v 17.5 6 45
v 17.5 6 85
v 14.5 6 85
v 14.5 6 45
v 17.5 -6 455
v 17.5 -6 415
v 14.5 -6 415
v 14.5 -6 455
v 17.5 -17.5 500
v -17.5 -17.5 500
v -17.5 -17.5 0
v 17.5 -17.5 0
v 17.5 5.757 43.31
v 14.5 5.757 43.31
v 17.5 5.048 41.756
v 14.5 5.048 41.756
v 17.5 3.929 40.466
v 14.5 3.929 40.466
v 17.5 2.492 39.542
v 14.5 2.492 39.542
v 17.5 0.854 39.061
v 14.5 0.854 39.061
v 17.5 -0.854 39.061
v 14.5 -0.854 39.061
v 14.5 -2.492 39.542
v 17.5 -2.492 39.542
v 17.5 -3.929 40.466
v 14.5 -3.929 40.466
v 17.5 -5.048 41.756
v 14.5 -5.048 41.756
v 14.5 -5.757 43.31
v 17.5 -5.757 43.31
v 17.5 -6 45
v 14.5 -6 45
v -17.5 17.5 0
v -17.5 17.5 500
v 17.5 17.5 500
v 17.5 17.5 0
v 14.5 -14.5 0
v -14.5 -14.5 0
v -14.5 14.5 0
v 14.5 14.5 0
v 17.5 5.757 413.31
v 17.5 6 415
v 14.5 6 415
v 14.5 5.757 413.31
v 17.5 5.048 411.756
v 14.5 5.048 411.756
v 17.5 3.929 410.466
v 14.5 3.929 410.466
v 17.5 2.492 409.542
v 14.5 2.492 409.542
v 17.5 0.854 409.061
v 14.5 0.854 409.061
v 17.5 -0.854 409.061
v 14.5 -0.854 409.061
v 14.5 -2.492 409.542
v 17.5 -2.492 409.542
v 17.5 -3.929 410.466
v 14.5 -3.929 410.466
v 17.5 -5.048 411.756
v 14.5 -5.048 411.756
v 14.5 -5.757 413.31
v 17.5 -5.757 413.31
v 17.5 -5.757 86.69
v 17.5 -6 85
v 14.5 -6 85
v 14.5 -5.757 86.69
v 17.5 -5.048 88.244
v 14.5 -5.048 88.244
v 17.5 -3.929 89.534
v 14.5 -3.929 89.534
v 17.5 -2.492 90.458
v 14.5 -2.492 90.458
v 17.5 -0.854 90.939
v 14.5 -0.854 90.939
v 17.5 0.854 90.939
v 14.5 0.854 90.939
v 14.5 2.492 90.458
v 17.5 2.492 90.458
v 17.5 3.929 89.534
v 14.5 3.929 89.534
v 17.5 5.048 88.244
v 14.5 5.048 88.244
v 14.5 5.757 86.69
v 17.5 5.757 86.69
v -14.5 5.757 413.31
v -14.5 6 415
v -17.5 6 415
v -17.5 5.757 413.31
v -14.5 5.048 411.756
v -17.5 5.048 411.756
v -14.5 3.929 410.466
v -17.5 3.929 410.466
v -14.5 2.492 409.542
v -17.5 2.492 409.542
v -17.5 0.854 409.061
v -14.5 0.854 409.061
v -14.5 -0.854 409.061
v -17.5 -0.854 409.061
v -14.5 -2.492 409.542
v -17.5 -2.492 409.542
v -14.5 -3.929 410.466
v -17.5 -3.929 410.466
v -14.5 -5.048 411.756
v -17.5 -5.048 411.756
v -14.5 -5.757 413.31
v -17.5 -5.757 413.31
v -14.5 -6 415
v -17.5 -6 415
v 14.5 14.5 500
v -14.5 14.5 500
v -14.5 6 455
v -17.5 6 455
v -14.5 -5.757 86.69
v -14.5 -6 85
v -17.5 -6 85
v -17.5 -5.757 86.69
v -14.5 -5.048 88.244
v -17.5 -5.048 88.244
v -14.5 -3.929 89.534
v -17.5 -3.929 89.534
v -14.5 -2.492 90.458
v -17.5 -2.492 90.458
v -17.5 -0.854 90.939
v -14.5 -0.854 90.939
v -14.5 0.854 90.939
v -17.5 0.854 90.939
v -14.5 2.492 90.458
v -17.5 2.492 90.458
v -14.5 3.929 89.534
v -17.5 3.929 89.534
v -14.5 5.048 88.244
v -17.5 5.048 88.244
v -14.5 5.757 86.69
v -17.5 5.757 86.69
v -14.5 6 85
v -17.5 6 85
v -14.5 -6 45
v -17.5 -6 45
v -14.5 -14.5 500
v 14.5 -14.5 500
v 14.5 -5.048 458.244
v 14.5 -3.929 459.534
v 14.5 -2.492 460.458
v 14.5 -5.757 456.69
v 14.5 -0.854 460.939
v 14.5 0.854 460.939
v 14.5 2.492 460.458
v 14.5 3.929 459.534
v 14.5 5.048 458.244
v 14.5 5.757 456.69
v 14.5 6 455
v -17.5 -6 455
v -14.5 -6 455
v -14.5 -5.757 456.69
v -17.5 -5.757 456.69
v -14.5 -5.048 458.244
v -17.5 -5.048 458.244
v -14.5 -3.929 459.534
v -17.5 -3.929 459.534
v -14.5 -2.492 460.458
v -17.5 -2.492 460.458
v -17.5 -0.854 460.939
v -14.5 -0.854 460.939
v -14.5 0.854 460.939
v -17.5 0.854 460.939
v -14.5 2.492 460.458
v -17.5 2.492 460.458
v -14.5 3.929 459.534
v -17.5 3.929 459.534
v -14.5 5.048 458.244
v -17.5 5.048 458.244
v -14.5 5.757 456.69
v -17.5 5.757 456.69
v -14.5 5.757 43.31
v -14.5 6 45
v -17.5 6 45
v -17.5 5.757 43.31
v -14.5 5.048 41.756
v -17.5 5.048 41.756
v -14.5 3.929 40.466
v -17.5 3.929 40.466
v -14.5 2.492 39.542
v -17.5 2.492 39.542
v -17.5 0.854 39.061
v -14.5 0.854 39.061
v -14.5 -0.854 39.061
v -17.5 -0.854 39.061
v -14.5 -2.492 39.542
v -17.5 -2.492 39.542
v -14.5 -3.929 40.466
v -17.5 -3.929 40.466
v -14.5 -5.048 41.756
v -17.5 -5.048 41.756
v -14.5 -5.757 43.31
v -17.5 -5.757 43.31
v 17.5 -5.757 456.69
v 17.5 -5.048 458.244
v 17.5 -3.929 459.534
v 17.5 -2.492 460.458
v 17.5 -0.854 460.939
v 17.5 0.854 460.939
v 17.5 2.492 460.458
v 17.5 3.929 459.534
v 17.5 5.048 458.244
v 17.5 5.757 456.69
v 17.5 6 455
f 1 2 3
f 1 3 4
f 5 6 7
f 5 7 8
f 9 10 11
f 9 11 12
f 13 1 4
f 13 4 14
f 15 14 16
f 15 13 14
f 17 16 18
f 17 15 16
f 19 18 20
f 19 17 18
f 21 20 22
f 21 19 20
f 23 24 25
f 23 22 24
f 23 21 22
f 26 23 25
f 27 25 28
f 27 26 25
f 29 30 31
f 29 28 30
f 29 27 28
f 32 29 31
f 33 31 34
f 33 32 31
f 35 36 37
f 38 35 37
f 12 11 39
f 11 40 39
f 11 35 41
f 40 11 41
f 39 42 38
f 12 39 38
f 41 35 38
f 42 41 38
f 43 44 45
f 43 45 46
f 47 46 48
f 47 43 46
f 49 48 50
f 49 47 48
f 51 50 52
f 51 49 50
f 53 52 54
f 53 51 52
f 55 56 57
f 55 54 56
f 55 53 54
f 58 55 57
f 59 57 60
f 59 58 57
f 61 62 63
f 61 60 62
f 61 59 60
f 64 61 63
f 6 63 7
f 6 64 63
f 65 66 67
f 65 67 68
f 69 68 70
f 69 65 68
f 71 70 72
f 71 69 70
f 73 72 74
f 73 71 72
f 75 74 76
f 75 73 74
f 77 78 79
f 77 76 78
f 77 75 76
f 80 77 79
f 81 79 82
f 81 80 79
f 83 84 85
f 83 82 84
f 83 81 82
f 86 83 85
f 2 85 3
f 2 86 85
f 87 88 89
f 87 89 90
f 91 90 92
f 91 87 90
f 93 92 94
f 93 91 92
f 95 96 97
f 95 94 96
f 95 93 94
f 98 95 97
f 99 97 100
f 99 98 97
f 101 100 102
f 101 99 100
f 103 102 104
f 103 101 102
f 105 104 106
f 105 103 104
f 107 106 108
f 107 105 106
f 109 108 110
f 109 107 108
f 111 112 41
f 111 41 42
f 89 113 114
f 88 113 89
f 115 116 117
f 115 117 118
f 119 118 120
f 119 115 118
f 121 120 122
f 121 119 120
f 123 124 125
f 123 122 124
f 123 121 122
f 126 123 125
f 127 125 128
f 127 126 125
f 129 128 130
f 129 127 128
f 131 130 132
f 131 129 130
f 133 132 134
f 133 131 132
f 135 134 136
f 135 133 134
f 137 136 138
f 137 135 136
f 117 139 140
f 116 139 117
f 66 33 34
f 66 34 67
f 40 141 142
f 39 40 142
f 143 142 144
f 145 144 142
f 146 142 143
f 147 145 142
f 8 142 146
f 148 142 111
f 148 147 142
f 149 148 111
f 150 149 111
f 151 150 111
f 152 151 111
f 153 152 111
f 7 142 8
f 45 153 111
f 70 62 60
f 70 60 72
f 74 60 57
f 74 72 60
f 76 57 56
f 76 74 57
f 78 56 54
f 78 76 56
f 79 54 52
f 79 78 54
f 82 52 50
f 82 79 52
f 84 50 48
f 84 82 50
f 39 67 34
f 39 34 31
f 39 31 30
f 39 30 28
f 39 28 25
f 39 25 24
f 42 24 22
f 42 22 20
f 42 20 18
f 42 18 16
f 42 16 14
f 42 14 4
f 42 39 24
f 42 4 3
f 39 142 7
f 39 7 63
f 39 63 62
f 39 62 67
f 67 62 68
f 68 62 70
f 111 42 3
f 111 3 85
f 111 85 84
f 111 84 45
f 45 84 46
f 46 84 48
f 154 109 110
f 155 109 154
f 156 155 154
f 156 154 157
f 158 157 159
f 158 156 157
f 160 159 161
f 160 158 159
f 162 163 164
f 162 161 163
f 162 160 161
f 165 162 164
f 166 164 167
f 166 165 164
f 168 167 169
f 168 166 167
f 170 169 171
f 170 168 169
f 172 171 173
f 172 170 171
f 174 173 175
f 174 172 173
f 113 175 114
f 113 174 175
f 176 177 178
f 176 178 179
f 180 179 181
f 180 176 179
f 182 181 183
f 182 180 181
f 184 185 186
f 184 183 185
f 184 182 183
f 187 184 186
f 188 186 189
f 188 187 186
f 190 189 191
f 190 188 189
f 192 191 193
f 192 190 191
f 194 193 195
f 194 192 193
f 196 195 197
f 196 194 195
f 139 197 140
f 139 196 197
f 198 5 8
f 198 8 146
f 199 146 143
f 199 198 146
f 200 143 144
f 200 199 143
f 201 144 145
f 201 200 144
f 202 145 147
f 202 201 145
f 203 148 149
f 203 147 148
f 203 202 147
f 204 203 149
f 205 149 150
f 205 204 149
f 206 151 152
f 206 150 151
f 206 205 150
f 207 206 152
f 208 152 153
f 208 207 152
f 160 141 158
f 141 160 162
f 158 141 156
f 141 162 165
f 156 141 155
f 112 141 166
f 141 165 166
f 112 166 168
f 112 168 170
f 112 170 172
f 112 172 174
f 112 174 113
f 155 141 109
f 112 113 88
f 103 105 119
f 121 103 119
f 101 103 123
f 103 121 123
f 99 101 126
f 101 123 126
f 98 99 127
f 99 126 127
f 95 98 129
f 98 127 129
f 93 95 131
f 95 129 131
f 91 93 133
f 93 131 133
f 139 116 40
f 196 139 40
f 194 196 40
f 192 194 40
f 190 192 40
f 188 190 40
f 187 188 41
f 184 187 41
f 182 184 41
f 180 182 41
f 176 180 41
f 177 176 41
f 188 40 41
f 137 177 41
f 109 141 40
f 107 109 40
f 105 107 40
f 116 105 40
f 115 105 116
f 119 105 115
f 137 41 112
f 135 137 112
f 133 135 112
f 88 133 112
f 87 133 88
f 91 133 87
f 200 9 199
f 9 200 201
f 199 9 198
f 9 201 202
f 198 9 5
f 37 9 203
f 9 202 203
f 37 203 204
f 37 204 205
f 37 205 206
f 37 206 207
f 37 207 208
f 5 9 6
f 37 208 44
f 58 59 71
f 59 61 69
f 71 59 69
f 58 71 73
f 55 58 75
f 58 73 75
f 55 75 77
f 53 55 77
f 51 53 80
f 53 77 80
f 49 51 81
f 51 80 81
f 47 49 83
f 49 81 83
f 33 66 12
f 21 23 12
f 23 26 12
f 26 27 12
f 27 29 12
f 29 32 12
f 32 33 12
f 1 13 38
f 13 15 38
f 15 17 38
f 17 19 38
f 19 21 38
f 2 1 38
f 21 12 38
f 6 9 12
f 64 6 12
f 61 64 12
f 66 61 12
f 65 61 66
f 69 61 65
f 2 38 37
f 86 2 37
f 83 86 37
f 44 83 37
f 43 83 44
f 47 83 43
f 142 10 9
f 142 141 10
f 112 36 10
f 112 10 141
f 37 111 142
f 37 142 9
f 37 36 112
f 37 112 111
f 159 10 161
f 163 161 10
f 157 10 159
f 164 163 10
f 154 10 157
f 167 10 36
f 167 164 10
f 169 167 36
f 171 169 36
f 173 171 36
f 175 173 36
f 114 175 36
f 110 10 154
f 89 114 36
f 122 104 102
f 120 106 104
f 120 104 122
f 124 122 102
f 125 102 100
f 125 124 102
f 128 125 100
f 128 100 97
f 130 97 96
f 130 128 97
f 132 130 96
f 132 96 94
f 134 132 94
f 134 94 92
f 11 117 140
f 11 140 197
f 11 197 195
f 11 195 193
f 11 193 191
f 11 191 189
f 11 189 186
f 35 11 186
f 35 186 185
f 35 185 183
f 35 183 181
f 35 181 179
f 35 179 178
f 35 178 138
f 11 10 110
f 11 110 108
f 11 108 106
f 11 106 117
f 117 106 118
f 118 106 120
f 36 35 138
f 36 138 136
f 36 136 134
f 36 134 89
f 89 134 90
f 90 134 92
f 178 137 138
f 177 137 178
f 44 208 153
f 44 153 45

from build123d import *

# Parameters (mm, degrees)
SZKIC1_W                    = 35
SZKIC1_H                    = 35
SZKIC1_W_2                  = 29
SZKIC1_H_2                  = 29
DODANIE_WYCI_GNI_CIE1_DEPTH = 500
WYTNIJ_WYCI_GNI_CIE1_REACH  = 503.529


with BuildPart() as part:
    # Szkic1 → Dodanie-wyciągnięcie1 (new body)
    with BuildSketch(Plane.XY):
        Rectangle(SZKIC1_W, SZKIC1_H)
        Rectangle(SZKIC1_W_2, SZKIC1_H_2, mode=Mode.SUBTRACT)
    extrude(amount=DODANIE_WYCI_GNI_CIE1_DEPTH)

    # Wytnij-wyciągnięcie1: up to this face of the body (flat: up to its plane)
    wytnij_wyci_gni_cie1_end = Plane(part.part.faces().sort_by_distance((-17.5, 0, 250))[0])
    # Szkic2 → Wytnij-wyciągnięcie1 (cut, up to the picked face)
    with BuildSketch(Plane(origin=(17.5, 0, 0), x_dir=(0, 0, -1), z_dir=(1, 0, 0)), mode=Mode.PRIVATE) as wytnij_wyci_gni_cie1_sk1:
        with BuildLine():
            Line((-455, 6), (-415, 6))
            ThreePointArc((-415, 6), (-409, 0), (-415, -6))
            Line((-415, -6), (-455, -6))
            ThreePointArc((-455, -6), (-461, 0), (-455, 6))
        make_face()
    wytnij_wyci_gni_cie1_tool1 = split(extrude(wytnij_wyci_gni_cie1_sk1.sketch, amount=-WYTNIJ_WYCI_GNI_CIE1_REACH, mode=Mode.PRIVATE), bisect_by=wytnij_wyci_gni_cie1_end, keep=Keep.BOTH, mode=Mode.PRIVATE)
    # Szkic2 → Wytnij-wyciągnięcie1 (cut, up to the picked face)
    with BuildSketch(Plane(origin=(17.5, 0, 0), x_dir=(0, 0, -1), z_dir=(1, 0, 0)), mode=Mode.PRIVATE) as wytnij_wyci_gni_cie1_sk2:
        with BuildLine():
            Line((-45, -6), (-85, -6))
            ThreePointArc((-85, -6), (-91, 0), (-85, 6))
            Line((-85, 6), (-45, 6))
            ThreePointArc((-45, 6), (-39, 0), (-45, -6))
        make_face()
    wytnij_wyci_gni_cie1_tool2 = split(extrude(wytnij_wyci_gni_cie1_sk2.sketch, amount=-WYTNIJ_WYCI_GNI_CIE1_REACH, mode=Mode.PRIVATE), bisect_by=wytnij_wyci_gni_cie1_end, keep=Keep.BOTH, mode=Mode.PRIVATE)
    add(wytnij_wyci_gni_cie1_tool1.solids().sort_by(Axis((17.5, 0, 435), (-1, 0, 0)))[0], mode=Mode.SUBTRACT)
    add(wytnij_wyci_gni_cie1_tool2.solids().sort_by(Axis((17.5, 0, 65), (-1, 0, 0)))[0], mode=Mode.SUBTRACT)


solid = part.part
